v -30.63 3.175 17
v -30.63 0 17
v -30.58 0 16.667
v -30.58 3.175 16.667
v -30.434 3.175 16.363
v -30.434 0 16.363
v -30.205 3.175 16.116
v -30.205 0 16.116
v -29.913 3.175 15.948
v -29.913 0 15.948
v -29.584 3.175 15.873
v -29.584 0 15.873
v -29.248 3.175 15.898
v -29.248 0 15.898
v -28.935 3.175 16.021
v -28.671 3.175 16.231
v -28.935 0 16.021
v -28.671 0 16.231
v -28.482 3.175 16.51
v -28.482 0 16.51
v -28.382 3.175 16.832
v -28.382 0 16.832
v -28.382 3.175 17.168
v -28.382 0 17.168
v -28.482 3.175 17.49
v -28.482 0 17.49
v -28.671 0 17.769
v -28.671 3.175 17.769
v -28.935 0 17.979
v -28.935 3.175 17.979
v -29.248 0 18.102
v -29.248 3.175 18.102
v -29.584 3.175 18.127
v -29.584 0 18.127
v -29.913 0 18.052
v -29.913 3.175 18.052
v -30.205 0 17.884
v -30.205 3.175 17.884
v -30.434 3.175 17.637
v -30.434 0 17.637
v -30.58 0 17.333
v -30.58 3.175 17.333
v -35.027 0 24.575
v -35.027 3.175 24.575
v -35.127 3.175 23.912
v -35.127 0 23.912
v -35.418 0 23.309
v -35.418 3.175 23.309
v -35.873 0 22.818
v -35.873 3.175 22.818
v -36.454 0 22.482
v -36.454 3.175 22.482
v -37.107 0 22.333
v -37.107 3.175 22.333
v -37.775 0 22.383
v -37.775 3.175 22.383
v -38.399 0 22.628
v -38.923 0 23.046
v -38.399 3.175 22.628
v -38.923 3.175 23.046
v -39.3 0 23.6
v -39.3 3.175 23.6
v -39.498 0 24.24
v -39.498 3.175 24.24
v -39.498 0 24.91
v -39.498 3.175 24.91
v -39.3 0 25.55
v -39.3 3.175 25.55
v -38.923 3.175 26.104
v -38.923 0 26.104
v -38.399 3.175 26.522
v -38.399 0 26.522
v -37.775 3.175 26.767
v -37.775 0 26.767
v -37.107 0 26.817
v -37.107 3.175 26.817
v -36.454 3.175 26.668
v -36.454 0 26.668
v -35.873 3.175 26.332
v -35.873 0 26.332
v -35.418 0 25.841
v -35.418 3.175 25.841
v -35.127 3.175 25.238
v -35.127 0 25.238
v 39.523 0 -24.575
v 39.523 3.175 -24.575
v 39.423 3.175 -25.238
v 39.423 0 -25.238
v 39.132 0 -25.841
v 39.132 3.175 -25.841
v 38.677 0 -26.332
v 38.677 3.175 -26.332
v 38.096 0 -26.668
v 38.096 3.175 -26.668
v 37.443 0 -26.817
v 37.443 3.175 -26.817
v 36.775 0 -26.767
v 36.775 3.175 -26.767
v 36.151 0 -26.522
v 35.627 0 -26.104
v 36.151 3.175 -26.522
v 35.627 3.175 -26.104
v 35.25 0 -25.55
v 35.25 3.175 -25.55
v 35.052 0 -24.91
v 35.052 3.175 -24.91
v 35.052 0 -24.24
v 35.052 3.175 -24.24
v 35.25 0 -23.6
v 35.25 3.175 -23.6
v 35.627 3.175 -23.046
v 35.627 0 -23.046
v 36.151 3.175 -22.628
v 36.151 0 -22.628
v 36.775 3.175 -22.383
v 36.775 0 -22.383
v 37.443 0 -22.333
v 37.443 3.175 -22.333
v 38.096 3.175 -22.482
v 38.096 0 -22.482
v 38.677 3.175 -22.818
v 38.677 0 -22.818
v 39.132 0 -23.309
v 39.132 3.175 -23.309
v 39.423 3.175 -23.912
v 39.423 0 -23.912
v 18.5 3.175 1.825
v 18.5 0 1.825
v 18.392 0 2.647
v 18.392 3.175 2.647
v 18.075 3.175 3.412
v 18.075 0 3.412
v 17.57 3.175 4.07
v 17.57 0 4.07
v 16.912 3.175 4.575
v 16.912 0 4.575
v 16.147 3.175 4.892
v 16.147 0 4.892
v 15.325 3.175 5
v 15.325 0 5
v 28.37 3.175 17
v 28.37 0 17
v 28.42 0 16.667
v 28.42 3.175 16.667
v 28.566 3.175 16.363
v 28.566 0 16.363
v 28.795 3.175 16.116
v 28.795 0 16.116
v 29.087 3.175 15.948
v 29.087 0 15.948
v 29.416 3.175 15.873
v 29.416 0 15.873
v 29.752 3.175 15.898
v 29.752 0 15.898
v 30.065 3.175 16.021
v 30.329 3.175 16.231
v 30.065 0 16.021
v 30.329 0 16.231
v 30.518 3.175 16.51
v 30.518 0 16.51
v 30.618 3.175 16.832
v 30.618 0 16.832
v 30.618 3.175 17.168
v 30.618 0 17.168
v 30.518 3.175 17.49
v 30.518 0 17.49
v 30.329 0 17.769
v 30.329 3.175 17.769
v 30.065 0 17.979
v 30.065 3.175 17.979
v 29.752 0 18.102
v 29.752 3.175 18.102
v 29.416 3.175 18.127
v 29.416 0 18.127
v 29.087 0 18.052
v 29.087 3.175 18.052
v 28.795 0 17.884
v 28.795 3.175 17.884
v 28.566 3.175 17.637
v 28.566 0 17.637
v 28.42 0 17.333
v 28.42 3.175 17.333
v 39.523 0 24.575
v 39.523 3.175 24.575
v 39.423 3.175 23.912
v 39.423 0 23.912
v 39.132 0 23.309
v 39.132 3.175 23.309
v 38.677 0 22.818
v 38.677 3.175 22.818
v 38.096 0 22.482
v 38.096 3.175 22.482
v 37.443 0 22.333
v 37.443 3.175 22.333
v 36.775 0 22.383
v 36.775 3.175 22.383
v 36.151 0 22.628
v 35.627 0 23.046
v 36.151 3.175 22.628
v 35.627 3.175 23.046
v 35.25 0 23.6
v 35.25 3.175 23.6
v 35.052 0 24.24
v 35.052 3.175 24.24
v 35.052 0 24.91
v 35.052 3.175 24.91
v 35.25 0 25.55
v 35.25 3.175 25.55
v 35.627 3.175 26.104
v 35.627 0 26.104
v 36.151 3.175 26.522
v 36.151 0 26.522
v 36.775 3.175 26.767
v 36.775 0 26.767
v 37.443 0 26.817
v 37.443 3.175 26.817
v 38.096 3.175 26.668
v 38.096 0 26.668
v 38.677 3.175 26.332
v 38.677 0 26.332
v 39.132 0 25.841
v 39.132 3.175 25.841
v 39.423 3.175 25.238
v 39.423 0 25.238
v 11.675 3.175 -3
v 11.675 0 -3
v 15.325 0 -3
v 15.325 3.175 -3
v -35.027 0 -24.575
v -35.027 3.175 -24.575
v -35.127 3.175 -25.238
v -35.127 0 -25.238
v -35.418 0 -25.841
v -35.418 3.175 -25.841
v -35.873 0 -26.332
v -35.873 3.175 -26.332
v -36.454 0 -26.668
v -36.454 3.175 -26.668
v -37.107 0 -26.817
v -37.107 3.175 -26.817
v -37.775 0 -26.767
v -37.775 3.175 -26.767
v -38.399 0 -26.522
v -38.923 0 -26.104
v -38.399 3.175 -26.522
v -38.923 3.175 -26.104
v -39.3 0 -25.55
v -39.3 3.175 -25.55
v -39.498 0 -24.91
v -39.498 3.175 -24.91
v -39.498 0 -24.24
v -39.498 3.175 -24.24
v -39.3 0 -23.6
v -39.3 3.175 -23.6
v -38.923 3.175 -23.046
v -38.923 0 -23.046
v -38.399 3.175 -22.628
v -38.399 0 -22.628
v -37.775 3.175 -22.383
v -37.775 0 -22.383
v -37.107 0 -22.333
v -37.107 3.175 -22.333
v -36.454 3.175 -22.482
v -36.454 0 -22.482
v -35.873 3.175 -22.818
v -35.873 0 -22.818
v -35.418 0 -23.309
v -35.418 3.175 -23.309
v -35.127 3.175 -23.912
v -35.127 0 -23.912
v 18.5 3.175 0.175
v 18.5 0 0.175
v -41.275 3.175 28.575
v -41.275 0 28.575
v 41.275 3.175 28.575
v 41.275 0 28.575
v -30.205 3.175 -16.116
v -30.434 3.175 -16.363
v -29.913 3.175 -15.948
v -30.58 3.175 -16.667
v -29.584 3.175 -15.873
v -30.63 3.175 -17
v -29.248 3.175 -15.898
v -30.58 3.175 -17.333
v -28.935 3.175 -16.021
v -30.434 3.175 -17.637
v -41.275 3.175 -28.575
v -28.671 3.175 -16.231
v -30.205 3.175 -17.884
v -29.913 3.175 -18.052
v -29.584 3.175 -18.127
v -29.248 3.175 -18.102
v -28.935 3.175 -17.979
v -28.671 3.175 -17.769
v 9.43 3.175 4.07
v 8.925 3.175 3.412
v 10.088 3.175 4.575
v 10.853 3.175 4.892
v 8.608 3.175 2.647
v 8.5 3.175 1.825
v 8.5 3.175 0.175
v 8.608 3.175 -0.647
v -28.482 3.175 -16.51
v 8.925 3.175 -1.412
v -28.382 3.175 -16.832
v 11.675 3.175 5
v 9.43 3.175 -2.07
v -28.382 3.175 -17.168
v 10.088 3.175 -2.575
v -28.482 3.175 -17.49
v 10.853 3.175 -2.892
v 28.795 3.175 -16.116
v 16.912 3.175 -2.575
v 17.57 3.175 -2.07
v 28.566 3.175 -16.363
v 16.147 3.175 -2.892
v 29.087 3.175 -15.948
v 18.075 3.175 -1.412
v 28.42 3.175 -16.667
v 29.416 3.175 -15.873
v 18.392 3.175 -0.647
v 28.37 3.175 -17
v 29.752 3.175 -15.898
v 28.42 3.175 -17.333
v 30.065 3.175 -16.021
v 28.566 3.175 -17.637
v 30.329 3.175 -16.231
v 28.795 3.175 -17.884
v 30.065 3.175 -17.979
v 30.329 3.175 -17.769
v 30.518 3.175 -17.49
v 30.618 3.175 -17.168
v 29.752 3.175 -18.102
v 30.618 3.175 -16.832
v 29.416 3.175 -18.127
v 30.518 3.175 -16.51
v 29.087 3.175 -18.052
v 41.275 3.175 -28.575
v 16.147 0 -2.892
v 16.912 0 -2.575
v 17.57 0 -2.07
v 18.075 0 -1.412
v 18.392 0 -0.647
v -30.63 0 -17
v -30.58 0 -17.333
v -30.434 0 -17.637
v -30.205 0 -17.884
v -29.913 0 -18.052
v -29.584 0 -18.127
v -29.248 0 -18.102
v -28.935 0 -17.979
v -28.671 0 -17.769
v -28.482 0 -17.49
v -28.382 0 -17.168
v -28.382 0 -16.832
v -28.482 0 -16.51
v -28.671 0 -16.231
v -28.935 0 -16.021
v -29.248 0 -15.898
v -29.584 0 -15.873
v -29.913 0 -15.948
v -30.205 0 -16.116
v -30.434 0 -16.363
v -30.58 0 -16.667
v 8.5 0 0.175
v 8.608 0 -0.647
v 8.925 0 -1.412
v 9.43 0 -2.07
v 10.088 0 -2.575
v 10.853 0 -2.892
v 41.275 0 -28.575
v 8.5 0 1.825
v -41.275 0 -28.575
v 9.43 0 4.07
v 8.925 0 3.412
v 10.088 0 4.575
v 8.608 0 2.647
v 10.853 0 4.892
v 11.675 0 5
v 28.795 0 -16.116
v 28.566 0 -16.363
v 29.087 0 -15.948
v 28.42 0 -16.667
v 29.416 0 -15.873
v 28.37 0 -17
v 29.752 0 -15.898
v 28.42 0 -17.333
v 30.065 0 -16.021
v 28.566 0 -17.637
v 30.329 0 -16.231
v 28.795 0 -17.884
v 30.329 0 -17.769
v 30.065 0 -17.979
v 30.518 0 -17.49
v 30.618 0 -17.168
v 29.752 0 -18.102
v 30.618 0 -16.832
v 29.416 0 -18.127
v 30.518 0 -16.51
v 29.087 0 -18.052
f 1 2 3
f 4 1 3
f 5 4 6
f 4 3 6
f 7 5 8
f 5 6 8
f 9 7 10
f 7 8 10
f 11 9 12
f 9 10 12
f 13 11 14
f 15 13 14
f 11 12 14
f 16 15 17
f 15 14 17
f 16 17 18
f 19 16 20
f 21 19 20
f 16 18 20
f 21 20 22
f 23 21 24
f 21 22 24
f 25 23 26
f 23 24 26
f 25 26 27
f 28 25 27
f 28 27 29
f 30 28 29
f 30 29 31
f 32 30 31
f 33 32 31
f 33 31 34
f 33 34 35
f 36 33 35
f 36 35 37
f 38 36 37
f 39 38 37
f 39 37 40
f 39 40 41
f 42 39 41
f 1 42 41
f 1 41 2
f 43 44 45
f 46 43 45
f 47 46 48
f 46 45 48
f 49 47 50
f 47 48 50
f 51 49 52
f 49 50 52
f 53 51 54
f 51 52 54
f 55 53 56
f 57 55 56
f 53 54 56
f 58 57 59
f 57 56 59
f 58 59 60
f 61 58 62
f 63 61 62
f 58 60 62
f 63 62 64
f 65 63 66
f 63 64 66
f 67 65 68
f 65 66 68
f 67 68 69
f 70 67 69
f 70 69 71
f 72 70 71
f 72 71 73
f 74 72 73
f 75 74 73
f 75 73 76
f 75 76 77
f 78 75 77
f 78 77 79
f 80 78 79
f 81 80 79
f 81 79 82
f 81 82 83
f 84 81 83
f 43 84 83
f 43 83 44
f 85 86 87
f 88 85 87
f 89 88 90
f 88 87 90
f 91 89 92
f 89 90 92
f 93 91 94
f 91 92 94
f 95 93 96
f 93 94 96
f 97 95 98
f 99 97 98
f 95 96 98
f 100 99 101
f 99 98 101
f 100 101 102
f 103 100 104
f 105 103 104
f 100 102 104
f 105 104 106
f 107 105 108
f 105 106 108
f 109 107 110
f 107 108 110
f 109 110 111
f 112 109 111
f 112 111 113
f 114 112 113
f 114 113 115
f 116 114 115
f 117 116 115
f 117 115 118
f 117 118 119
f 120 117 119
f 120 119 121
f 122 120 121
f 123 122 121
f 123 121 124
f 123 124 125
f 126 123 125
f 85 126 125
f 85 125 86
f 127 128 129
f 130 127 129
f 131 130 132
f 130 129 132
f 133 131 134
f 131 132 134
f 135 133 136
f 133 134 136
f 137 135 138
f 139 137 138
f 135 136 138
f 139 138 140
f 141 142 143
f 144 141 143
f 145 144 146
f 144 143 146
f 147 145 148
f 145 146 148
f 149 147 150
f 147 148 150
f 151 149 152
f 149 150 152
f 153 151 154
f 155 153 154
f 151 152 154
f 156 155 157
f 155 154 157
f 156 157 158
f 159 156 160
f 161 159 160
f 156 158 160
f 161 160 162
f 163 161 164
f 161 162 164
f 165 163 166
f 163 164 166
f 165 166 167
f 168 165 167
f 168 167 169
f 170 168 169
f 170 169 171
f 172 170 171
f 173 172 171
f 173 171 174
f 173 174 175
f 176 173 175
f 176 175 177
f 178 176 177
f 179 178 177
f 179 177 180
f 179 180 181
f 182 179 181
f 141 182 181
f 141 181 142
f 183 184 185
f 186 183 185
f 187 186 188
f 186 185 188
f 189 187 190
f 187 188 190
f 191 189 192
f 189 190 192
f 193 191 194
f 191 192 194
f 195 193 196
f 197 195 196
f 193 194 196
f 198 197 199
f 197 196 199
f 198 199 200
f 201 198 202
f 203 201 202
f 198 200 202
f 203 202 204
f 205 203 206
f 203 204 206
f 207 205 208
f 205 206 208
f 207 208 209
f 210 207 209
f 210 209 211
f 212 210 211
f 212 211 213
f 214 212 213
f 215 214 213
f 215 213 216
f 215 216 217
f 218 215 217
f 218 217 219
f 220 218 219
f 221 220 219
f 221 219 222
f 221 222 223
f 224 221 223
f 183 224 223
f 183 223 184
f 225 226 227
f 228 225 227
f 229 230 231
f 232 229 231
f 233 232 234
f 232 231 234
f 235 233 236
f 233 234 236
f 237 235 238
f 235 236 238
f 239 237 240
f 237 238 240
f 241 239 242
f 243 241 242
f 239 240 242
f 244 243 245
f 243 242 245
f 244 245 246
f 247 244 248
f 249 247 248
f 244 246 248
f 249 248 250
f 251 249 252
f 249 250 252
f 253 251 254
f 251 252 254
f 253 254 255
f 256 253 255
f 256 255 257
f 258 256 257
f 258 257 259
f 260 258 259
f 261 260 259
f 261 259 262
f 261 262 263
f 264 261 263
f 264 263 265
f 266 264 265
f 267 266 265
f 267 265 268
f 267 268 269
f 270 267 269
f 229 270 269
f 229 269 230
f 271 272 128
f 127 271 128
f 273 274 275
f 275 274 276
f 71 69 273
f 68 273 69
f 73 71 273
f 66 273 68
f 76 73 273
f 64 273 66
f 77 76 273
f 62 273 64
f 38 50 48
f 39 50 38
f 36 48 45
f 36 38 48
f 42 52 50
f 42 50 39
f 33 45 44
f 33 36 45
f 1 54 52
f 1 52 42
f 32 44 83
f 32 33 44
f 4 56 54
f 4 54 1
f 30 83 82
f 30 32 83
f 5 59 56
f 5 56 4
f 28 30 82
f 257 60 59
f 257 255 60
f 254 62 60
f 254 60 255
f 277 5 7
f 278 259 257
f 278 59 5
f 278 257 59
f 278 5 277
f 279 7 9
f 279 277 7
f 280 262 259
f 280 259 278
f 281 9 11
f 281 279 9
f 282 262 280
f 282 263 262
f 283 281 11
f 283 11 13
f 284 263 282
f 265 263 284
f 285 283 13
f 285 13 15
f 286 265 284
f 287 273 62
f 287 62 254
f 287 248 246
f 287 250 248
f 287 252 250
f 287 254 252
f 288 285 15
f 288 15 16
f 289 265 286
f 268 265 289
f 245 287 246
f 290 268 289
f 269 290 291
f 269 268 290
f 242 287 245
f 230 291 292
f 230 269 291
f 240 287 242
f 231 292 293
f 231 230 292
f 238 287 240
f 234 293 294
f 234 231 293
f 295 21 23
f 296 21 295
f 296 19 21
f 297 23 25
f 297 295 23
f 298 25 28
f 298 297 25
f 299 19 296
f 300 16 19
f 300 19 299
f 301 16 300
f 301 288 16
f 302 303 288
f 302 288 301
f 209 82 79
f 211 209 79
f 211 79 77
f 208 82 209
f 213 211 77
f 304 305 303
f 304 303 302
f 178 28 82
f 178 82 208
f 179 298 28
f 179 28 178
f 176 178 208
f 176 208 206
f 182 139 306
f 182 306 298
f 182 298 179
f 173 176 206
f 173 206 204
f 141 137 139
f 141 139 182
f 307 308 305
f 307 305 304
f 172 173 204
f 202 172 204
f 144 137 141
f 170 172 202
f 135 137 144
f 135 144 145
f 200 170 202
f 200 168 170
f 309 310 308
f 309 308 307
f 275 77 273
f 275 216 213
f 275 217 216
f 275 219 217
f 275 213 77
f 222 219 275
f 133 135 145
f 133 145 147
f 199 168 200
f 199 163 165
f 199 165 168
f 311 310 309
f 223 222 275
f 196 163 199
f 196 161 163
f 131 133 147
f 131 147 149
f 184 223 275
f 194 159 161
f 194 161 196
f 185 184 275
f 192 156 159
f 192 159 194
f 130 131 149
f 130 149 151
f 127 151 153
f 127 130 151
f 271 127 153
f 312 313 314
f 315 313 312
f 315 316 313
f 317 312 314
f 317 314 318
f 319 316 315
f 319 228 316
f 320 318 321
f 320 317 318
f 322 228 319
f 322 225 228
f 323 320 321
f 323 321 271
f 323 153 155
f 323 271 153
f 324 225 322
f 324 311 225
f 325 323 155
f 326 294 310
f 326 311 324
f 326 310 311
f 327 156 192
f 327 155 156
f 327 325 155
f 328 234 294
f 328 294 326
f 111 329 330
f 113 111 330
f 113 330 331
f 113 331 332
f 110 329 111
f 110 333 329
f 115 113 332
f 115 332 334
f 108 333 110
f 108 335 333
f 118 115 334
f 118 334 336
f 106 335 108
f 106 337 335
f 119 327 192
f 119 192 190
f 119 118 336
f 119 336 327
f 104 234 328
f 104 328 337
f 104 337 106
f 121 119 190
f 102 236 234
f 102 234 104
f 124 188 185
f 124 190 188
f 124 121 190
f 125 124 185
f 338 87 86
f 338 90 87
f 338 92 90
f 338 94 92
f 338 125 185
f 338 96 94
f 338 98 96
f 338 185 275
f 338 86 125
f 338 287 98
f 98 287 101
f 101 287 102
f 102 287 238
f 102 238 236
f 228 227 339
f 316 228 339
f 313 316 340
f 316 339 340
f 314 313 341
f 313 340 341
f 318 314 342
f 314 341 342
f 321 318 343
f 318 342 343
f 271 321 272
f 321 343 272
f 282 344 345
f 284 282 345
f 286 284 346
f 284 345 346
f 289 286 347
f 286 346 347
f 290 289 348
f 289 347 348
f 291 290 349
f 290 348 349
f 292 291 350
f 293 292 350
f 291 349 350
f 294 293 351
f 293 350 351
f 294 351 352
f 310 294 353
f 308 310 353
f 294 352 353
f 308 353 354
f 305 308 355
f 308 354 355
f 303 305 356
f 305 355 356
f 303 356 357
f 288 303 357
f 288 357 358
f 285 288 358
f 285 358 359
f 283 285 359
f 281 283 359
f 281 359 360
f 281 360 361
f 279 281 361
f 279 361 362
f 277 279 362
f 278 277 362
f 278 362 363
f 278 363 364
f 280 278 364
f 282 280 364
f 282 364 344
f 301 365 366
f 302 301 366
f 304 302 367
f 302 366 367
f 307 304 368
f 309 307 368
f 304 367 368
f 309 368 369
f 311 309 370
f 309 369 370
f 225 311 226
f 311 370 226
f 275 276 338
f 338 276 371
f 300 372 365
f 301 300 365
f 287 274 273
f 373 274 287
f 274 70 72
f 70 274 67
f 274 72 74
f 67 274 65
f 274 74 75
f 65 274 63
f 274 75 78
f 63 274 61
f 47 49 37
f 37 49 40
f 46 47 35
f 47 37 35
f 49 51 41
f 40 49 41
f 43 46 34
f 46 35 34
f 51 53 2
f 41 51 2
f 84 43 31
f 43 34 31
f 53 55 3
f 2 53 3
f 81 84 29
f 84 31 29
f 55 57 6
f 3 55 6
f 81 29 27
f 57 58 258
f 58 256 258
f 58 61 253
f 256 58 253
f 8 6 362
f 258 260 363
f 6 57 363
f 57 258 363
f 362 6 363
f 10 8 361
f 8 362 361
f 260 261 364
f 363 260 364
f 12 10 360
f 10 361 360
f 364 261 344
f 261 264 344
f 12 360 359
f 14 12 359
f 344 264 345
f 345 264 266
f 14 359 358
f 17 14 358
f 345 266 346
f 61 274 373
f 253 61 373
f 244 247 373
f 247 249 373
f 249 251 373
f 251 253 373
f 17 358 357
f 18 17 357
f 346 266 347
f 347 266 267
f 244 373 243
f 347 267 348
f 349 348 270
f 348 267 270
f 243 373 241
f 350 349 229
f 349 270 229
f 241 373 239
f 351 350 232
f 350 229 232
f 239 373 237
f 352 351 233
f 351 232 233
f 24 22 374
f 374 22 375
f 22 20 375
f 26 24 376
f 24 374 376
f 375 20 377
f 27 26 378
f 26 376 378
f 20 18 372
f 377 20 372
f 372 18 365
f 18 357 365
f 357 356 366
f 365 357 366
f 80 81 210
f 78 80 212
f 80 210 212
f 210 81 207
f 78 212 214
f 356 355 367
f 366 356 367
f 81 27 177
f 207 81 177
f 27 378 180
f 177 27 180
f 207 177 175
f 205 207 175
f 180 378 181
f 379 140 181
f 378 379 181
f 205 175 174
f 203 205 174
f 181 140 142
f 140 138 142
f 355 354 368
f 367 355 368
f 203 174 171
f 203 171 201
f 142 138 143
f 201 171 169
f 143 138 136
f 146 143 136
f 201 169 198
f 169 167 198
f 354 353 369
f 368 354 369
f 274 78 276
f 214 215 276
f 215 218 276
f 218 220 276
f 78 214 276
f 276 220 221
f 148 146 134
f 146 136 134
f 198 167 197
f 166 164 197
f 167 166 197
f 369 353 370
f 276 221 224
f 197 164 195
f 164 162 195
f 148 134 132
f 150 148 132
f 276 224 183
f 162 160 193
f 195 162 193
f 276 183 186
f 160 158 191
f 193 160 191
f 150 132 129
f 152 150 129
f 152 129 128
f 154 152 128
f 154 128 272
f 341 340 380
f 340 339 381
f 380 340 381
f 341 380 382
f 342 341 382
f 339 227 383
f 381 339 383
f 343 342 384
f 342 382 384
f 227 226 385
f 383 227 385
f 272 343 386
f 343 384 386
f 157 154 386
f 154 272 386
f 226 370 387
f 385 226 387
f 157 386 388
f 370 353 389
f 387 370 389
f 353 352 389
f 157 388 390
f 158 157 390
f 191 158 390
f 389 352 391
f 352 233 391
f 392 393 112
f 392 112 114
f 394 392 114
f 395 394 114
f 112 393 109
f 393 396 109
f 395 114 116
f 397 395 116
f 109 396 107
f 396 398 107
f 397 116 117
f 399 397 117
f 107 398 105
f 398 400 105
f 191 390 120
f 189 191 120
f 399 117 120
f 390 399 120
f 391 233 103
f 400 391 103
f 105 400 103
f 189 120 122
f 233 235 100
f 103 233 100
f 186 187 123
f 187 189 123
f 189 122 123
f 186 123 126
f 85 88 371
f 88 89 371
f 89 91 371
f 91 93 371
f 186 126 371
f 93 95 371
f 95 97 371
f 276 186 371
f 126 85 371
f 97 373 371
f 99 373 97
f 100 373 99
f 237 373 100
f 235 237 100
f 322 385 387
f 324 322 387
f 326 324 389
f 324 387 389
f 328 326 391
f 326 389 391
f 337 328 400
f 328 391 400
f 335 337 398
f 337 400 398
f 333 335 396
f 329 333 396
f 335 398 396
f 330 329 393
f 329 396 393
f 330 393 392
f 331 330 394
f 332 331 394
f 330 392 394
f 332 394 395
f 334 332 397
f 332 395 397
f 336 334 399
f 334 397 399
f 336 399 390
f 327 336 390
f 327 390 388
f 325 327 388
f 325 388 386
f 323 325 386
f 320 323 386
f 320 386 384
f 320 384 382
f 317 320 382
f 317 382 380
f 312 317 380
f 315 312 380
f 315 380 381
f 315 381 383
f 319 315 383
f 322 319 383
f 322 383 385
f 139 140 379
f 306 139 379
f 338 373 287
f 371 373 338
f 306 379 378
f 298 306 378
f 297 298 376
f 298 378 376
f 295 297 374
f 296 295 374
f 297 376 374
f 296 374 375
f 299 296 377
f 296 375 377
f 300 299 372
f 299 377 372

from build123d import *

# Parameters (mm, degrees)
SKETCH1_W             = 82.55
SKETCH1_H             = 57.15
BOSS_EXTRUDE1_DEPTH   = 3.175
CUT_EXTRUDE5_DEPTH    = 10
F_8_CLEARANCE_HOLE1_D = 4.4958
F_4_40_TAPPED_HOLE1_D = 2.2606


with BuildPart() as part:
    # Sketch1 → Boss-Extrude1 (new body)
    with BuildSketch(Plane(origin=(0, 0, 0), x_dir=(1, 0, 0), z_dir=(0, 1, 0))):
        Rectangle(SKETCH1_W, SKETCH1_H)
    extrude(amount=BOSS_EXTRUDE1_DEPTH)

    # Sketch2 → Cut-Extrude5 (cut)
    with BuildSketch(Plane.XZ):
        with BuildLine():
            Line((8.5, 1.825), (8.5, 0.175))
            ThreePointArc((8.5, 0.175), (9.42993597, -2.07006403), (11.675, -3))
            Line((11.675, -3), (15.325, -3))
            ThreePointArc((15.325, -3), (17.57006403, -2.07006403), (18.5, 0.175))
            Line((18.5, 0.175), (18.5, 1.825))
            ThreePointArc((18.5, 1.825), (17.57006403, 4.07006403), (15.325, 5))
            Line((15.325, 5), (11.675, 5))
            ThreePointArc((11.675, 5), (9.42993597, 4.07006403), (8.5, 1.825))
        make_face()
    extrude(amount=-CUT_EXTRUDE5_DEPTH, mode=Mode.SUBTRACT)

    # #8 Clearance Hole1 (through all)
    with Locations(Plane(origin=(0, 0, 0), x_dir=(-1, 0, 0), z_dir=(0, -1, 0))):
        with Locations((-37.275, 24.575), (37.275, 24.575), (37.275, -24.575), (-37.275, -24.575)):
            Hole(F_8_CLEARANCE_HOLE1_D / 2)

    # #4-40 Tapped Hole1 (through all)
    with Locations(Plane(origin=(0, 3.175, 0), x_dir=(1, 0, 0), z_dir=(0, 1, 0))):
        with Locations((-29.5, -17), (-29.5, 17), (29.5, 17), (29.5, -17)):
            Hole(F_4_40_TAPPED_HOLE1_D / 2)


solid = part.part
